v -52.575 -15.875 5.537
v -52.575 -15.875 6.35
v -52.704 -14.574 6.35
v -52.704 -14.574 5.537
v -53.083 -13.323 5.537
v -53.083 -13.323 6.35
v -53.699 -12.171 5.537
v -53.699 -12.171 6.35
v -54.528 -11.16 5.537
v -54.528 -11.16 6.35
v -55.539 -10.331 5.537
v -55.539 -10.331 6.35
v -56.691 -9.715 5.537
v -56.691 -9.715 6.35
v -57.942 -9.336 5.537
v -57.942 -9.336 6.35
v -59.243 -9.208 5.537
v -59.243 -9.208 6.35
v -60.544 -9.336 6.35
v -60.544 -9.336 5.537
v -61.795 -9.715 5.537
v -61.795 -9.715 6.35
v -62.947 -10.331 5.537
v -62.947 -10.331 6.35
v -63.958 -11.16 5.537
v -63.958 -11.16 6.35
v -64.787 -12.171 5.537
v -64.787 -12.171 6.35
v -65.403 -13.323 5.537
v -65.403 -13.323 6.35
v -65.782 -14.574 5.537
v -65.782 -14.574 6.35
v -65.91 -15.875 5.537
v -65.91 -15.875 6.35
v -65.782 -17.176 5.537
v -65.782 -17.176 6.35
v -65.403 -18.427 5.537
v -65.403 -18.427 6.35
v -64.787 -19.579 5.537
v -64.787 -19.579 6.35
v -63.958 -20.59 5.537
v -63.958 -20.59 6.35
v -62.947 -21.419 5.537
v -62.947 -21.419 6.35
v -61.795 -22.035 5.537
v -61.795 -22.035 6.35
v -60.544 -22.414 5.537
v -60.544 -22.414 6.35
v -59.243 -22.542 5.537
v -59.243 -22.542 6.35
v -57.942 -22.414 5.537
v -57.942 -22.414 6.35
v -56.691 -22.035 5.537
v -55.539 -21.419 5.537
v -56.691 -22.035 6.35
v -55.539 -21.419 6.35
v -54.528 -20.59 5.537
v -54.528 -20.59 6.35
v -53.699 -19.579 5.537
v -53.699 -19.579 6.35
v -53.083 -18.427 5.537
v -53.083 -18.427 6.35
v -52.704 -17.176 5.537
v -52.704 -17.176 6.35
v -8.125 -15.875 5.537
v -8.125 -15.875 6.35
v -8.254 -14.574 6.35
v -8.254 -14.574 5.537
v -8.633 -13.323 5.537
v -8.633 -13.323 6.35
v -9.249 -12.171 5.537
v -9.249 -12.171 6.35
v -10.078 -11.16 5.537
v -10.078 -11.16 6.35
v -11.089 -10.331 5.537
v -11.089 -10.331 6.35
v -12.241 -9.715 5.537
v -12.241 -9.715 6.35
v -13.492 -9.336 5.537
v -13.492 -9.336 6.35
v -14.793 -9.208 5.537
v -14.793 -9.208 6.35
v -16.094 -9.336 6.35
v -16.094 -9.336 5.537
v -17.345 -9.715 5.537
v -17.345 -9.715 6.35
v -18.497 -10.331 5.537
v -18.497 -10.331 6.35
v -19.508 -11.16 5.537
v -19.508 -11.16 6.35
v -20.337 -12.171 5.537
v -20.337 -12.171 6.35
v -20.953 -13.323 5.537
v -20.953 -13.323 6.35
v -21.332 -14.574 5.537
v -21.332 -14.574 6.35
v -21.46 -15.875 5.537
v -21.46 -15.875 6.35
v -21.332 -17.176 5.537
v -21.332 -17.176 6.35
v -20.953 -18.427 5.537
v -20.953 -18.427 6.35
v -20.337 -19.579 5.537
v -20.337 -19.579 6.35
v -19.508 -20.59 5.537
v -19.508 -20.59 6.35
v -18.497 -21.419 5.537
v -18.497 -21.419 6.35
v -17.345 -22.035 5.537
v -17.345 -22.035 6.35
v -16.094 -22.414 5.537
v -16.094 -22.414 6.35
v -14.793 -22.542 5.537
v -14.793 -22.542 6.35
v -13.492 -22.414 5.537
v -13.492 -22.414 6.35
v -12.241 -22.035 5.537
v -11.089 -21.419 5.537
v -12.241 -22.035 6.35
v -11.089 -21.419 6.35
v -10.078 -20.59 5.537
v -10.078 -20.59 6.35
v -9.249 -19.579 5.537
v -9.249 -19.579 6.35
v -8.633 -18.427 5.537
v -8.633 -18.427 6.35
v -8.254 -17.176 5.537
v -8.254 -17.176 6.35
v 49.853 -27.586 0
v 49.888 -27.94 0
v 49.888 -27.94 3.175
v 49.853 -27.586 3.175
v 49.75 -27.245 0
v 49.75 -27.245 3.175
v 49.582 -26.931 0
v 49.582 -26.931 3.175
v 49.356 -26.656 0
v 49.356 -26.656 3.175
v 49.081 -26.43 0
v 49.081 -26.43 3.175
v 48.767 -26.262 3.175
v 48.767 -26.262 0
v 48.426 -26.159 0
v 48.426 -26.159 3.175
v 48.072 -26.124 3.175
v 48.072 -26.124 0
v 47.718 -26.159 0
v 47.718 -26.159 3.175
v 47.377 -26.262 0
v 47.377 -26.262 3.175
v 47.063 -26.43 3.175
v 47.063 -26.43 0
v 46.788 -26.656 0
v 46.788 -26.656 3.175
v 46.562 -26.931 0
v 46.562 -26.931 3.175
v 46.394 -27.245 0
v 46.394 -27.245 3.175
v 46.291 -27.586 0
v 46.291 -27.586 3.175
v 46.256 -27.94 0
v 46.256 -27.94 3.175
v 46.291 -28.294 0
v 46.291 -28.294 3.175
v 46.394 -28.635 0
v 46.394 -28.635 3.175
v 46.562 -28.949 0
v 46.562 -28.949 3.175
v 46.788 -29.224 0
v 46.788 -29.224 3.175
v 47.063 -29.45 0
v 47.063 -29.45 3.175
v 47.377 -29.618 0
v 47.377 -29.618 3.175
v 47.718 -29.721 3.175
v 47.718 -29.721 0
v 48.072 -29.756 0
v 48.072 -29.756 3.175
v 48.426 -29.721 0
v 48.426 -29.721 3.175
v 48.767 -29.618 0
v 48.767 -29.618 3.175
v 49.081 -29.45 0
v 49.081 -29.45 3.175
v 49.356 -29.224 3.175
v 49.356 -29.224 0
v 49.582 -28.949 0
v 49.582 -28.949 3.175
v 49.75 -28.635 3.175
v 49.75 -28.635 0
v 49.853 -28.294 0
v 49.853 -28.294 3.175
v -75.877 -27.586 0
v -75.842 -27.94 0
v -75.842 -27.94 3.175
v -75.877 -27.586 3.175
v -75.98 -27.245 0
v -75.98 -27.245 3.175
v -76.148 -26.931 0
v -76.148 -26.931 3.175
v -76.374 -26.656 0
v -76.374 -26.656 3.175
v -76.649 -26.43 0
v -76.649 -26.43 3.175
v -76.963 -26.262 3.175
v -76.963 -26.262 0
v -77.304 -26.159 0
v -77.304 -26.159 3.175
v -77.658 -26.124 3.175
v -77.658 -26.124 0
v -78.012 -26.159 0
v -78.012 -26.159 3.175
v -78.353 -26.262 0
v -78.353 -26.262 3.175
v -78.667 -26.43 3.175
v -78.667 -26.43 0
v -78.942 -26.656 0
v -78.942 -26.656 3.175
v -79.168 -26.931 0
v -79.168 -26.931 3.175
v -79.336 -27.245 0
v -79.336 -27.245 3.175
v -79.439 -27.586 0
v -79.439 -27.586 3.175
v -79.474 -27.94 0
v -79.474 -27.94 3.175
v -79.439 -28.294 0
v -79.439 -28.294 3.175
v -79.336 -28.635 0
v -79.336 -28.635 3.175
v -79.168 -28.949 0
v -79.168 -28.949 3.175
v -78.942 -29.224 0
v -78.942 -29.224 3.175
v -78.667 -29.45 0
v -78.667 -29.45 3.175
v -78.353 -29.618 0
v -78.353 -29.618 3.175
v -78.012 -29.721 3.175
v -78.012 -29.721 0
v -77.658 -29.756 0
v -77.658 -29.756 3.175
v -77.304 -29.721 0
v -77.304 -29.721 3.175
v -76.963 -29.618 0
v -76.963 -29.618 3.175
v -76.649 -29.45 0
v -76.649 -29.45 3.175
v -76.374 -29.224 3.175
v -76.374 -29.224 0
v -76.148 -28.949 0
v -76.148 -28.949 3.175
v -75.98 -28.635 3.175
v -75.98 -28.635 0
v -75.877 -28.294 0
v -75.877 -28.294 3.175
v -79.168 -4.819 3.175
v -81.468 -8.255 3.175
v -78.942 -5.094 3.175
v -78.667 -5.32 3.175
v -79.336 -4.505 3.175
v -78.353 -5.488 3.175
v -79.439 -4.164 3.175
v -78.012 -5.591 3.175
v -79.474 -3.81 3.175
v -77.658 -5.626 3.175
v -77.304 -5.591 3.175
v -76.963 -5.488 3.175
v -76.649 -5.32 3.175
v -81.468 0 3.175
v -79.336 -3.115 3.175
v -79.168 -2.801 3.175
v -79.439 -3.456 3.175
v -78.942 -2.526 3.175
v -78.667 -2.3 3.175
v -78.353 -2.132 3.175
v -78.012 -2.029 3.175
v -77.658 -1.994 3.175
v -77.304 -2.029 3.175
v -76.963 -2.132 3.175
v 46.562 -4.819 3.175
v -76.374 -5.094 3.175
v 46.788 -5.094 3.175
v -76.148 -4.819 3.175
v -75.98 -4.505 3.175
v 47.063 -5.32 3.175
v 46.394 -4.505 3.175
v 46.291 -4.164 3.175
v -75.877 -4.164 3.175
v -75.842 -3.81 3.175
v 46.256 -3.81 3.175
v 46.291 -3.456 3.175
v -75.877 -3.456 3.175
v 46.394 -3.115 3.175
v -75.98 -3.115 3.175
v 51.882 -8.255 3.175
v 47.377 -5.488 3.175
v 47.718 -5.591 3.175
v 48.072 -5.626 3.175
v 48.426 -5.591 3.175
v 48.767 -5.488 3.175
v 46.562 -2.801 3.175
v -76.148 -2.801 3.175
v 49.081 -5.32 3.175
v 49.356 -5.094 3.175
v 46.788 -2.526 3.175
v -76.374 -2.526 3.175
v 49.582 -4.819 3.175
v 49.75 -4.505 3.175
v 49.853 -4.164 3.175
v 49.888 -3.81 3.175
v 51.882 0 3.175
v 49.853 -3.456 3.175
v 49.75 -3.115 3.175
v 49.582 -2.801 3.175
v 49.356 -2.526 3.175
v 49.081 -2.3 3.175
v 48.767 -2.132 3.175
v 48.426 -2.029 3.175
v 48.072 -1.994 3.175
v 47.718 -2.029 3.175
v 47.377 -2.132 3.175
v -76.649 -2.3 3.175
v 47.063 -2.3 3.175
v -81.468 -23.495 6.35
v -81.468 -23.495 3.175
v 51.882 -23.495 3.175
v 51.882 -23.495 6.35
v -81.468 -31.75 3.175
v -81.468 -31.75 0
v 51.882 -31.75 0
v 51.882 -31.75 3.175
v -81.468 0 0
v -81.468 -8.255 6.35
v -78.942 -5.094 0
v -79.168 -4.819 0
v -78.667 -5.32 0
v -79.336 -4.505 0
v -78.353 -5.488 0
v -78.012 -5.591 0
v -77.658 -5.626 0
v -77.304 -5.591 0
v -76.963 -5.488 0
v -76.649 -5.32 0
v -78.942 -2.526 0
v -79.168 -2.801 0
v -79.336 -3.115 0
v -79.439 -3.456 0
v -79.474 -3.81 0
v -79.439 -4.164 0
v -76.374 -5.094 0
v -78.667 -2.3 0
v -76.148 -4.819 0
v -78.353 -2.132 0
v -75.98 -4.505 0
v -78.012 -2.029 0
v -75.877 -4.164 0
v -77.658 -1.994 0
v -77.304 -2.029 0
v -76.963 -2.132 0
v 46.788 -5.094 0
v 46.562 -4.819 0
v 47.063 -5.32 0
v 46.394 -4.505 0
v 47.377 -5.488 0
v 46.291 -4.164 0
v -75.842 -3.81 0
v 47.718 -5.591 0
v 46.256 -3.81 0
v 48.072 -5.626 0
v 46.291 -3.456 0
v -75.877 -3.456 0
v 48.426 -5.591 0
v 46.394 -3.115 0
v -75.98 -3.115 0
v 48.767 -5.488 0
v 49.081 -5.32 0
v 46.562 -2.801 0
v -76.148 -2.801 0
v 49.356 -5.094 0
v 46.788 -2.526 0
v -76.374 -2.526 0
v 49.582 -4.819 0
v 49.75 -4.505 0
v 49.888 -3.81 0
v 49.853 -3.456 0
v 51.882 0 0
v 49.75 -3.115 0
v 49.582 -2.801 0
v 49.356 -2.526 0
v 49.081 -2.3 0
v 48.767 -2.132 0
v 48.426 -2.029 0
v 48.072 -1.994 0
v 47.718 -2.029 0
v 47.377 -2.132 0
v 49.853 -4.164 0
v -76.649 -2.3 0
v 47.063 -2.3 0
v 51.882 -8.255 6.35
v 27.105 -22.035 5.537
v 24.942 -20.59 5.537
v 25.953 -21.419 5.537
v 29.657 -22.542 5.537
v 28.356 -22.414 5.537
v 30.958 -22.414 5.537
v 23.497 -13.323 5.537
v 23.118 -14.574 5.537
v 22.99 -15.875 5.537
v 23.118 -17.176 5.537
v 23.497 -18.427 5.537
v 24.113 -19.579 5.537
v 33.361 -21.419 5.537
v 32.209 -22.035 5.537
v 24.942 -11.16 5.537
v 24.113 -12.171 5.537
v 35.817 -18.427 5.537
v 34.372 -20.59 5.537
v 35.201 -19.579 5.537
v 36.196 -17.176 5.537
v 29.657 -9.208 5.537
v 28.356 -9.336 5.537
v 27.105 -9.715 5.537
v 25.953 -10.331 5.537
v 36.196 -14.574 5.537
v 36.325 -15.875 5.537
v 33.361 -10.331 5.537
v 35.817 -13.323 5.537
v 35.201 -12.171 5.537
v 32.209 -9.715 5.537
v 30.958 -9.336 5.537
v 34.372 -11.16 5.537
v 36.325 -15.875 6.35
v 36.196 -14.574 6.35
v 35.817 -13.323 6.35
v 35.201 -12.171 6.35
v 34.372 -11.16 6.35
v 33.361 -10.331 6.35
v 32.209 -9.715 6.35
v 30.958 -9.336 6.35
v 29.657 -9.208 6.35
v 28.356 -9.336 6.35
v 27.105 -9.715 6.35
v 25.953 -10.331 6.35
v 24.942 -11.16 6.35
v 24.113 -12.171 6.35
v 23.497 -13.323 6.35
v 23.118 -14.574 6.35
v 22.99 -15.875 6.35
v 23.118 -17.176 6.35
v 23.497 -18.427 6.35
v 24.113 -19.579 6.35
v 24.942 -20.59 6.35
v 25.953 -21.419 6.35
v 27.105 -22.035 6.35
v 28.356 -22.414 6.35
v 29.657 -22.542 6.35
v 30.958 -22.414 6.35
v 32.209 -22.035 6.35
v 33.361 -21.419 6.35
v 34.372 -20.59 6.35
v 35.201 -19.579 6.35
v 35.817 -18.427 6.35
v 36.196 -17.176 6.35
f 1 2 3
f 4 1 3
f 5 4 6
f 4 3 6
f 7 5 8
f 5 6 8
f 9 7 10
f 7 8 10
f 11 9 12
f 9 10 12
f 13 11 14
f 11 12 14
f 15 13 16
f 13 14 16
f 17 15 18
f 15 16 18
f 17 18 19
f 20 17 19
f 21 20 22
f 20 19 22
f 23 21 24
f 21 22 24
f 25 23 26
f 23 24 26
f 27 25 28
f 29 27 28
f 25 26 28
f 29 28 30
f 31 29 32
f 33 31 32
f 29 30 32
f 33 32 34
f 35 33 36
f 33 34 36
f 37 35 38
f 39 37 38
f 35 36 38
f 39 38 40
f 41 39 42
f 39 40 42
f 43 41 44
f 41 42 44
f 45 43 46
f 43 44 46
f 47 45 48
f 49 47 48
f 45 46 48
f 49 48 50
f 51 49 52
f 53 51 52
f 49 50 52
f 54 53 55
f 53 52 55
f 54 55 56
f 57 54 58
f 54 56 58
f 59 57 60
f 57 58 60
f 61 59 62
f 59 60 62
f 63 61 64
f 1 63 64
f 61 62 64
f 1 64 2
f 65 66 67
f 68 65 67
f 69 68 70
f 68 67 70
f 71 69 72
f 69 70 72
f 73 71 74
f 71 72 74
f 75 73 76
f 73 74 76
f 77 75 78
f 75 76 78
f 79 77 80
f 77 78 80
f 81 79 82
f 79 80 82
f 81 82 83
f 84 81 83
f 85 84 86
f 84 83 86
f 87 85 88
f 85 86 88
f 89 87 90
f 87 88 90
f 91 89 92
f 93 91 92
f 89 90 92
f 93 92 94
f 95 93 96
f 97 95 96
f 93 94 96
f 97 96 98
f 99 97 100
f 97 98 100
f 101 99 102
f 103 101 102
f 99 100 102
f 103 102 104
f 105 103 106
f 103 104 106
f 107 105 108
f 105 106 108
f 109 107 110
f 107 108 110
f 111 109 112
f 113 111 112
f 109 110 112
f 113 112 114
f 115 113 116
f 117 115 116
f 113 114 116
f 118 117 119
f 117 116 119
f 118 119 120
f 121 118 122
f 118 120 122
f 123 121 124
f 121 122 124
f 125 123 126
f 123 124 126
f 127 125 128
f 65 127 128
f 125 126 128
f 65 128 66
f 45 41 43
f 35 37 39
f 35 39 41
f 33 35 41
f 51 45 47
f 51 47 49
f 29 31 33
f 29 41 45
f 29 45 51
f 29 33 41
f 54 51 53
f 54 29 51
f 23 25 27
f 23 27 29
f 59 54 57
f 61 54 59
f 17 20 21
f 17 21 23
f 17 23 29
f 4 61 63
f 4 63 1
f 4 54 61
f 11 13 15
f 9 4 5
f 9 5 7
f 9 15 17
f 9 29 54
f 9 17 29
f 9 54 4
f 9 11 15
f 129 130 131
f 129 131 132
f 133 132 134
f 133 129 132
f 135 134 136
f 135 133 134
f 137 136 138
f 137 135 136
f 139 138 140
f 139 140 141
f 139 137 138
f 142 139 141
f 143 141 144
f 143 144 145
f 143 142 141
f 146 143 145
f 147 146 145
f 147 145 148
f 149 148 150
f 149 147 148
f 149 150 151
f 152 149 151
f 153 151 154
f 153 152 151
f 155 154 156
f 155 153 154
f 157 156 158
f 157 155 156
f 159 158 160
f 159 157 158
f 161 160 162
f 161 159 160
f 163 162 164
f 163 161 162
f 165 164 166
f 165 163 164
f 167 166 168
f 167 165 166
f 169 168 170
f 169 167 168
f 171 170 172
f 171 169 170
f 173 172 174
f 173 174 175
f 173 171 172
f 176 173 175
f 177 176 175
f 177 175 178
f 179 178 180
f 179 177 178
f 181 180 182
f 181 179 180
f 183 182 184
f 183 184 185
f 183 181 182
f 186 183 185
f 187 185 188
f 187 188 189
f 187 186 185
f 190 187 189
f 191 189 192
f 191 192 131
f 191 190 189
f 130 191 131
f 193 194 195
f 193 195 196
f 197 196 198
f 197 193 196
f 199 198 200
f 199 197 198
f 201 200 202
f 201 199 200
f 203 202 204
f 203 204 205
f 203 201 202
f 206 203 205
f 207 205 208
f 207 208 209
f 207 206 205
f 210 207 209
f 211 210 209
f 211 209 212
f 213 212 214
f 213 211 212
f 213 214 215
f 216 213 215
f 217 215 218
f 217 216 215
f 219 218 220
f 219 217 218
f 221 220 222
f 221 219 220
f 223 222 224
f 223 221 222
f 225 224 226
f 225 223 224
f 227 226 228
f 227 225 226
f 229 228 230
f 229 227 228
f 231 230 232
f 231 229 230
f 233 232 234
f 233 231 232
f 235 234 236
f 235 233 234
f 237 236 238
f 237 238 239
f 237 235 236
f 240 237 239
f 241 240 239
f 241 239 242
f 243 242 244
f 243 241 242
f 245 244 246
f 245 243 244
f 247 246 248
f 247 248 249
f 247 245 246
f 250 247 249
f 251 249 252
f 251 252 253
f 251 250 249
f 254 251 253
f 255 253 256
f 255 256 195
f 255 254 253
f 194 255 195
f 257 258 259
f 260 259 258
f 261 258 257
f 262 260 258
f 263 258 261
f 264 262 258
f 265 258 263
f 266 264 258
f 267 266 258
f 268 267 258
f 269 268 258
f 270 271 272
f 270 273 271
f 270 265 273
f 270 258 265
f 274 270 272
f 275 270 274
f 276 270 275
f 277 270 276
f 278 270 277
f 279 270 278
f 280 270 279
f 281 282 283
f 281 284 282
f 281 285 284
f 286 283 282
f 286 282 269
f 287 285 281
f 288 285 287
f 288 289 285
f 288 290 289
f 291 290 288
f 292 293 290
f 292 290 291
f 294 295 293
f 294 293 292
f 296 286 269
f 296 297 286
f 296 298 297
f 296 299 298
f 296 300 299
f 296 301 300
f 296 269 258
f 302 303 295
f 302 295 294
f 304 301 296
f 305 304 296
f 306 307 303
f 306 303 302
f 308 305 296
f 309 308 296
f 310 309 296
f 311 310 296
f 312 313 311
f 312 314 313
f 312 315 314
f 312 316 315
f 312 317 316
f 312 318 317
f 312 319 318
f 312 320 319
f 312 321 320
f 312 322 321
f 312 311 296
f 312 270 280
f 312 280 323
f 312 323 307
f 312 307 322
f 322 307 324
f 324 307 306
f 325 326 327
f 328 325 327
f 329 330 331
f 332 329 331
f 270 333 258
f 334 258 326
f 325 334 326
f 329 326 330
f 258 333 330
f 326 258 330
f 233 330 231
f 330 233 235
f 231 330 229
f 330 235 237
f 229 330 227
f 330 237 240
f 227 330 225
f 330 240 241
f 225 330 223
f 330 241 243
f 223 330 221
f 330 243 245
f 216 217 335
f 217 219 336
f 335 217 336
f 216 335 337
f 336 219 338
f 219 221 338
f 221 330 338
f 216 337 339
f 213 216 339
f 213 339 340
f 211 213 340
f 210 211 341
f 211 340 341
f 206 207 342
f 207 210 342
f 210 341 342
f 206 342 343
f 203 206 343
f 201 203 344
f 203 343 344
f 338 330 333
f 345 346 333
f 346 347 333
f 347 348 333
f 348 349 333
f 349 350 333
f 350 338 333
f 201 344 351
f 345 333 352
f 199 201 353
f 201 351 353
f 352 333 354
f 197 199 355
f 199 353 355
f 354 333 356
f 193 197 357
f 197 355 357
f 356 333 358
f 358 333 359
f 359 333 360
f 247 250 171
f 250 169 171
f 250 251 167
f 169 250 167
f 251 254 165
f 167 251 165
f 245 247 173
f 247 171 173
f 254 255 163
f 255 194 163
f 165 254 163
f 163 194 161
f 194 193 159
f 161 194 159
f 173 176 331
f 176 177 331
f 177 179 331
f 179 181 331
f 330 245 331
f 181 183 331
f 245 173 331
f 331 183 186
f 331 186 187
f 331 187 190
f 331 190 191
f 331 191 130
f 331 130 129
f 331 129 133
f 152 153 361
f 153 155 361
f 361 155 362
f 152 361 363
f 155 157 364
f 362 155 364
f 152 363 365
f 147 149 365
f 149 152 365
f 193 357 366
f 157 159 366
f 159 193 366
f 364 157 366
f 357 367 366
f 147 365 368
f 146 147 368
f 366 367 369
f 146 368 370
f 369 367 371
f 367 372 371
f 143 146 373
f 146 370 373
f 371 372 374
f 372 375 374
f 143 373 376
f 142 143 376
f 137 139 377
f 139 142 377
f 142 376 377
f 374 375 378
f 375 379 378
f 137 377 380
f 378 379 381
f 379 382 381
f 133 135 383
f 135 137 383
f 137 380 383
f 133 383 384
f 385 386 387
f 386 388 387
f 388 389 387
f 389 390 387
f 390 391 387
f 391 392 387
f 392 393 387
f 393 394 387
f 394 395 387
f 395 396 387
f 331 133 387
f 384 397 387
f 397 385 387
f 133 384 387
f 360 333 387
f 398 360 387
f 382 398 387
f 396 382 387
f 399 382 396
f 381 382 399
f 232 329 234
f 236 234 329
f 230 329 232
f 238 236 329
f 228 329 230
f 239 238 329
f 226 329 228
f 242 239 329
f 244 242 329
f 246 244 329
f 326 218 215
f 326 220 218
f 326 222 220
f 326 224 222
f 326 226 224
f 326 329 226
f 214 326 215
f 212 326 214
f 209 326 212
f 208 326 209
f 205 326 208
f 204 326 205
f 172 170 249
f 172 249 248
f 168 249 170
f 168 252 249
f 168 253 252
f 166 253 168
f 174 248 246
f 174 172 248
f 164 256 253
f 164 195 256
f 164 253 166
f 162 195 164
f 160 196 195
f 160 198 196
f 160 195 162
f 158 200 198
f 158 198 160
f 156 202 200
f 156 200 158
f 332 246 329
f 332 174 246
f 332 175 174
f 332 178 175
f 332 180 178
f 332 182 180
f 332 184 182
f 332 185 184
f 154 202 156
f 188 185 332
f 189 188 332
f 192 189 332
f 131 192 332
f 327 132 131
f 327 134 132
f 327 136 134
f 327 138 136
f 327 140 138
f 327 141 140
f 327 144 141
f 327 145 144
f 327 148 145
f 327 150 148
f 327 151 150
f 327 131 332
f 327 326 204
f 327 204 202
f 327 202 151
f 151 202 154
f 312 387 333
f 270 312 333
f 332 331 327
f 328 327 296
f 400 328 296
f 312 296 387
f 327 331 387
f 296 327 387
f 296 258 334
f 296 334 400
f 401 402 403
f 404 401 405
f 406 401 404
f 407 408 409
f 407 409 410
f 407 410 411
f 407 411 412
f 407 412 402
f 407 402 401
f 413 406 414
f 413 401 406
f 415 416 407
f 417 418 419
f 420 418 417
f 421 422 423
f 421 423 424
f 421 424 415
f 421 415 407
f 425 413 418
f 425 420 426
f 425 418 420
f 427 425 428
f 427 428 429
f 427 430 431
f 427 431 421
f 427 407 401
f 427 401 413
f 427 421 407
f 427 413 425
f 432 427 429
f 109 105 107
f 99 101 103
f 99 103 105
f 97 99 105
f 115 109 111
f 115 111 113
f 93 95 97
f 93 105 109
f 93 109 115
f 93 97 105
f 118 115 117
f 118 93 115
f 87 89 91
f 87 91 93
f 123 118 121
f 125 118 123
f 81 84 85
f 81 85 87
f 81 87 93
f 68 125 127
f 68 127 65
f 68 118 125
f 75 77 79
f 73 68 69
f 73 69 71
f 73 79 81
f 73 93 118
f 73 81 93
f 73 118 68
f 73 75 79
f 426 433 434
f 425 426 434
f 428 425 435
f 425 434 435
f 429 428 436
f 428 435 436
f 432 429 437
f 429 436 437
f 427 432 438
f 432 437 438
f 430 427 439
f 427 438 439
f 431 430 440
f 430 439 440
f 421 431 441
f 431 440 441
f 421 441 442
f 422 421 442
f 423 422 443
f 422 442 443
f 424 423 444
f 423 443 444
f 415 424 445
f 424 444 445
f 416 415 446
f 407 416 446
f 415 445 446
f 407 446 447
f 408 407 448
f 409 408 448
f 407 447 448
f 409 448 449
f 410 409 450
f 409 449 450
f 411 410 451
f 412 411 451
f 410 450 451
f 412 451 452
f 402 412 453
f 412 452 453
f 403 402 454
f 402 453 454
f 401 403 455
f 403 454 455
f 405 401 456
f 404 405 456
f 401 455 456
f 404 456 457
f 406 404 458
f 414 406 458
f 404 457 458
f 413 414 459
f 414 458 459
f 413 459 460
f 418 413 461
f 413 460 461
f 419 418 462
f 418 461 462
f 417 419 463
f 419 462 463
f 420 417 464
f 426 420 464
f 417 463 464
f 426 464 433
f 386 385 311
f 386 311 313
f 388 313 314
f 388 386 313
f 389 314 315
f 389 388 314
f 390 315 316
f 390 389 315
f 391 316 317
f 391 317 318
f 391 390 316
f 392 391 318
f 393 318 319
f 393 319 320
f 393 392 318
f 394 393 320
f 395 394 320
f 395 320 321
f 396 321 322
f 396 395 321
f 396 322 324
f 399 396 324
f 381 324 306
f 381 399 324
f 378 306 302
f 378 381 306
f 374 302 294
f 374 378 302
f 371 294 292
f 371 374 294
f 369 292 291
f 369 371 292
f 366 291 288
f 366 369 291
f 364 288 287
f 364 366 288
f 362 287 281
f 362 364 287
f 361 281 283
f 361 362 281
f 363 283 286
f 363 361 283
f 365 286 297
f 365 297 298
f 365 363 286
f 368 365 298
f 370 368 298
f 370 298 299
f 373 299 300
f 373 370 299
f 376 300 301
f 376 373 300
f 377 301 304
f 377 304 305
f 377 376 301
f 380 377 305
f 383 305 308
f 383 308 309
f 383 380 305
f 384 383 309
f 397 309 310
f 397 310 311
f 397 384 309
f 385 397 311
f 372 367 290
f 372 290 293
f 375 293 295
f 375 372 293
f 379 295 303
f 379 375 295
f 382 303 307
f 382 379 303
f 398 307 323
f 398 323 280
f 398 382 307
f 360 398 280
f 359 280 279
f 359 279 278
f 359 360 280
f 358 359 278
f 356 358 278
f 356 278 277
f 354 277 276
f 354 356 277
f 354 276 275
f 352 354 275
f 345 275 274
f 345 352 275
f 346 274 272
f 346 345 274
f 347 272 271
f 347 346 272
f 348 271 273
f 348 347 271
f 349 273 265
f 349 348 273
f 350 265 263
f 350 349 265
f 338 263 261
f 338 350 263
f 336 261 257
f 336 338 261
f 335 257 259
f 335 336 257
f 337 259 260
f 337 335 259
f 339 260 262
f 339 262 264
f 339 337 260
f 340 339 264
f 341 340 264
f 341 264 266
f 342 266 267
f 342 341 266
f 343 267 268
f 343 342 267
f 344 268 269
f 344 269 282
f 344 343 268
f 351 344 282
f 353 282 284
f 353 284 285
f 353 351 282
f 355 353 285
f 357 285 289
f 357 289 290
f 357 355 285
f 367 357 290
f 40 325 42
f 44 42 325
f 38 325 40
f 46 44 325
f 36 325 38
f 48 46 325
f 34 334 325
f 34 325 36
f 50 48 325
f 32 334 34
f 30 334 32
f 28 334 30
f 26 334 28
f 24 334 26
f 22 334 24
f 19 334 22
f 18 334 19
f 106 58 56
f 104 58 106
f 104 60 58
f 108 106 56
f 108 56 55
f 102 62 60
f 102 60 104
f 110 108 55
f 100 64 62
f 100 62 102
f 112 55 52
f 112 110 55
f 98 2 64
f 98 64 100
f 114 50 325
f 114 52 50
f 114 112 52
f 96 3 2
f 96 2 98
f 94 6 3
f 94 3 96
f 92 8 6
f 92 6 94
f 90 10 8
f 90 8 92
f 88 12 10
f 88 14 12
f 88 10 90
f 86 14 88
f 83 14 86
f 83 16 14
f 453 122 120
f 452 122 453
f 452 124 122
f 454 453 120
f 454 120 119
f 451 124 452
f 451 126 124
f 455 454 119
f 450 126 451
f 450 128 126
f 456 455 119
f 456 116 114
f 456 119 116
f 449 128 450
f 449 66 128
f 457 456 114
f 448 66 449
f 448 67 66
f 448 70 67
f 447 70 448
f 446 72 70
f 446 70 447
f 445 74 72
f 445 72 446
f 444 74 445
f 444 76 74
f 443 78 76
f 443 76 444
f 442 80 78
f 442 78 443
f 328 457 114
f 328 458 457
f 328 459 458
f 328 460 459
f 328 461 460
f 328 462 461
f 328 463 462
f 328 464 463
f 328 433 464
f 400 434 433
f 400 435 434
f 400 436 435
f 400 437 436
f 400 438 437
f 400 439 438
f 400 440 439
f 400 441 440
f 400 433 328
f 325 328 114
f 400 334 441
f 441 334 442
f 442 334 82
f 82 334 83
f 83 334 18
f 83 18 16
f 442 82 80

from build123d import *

# Parameters (mm, degrees)
F0_R     = 1.8161
F1_DEPTH = 3.175
F2_W     = 133.35
F2_H     = 15.24
F3_DEPTH = 3.175
F4_R     = 6.6675
F5_DEPTH = 0.8128


with BuildPart() as f1:
    # F0 (on Top) → F1 (new body)
    with BuildSketch(Plane.XY):
        Polygon((51.882015, -8.216515), (51.882015, 0), (-81.467985, 0), (-81.467985, -8.216515), (-81.467985, -24.110759), (-81.467985, -31.75), (51.882015, -31.75), (51.882015, -24.110759), align=None)
        with Locations((-77.657985, -27.94)):
            Circle(F0_R, mode=Mode.SUBTRACT)
        with Locations((48.072015, -27.94)):
            Circle(F0_R, mode=Mode.SUBTRACT)
        with Locations((-77.657985, -3.81)):
            Circle(F0_R, mode=Mode.SUBTRACT)
        with Locations((48.072015, -3.81)):
            Circle(F0_R, mode=Mode.SUBTRACT)
    extrude(amount=F1_DEPTH)

    # F2 (on face) → F3 (join)
    with BuildSketch(Plane.XY.offset(3.175)):
        with Locations((-14.792985, -15.875)):
            Rectangle(F2_W, F2_H)
    extrude(amount=F3_DEPTH)

    # F4 (on face) → F5 (cut)
    with BuildSketch(Plane.XY.offset(6.35)):
        with Locations((-59.242985, -15.875)):
            Circle(F4_R)
        with Locations((-14.792985, -15.875)):
            Circle(F4_R)
        with Locations((29.657015, -15.875)):
            Circle(F4_R)
    extrude(amount=-F5_DEPTH, mode=Mode.SUBTRACT)


solid = f1.part
